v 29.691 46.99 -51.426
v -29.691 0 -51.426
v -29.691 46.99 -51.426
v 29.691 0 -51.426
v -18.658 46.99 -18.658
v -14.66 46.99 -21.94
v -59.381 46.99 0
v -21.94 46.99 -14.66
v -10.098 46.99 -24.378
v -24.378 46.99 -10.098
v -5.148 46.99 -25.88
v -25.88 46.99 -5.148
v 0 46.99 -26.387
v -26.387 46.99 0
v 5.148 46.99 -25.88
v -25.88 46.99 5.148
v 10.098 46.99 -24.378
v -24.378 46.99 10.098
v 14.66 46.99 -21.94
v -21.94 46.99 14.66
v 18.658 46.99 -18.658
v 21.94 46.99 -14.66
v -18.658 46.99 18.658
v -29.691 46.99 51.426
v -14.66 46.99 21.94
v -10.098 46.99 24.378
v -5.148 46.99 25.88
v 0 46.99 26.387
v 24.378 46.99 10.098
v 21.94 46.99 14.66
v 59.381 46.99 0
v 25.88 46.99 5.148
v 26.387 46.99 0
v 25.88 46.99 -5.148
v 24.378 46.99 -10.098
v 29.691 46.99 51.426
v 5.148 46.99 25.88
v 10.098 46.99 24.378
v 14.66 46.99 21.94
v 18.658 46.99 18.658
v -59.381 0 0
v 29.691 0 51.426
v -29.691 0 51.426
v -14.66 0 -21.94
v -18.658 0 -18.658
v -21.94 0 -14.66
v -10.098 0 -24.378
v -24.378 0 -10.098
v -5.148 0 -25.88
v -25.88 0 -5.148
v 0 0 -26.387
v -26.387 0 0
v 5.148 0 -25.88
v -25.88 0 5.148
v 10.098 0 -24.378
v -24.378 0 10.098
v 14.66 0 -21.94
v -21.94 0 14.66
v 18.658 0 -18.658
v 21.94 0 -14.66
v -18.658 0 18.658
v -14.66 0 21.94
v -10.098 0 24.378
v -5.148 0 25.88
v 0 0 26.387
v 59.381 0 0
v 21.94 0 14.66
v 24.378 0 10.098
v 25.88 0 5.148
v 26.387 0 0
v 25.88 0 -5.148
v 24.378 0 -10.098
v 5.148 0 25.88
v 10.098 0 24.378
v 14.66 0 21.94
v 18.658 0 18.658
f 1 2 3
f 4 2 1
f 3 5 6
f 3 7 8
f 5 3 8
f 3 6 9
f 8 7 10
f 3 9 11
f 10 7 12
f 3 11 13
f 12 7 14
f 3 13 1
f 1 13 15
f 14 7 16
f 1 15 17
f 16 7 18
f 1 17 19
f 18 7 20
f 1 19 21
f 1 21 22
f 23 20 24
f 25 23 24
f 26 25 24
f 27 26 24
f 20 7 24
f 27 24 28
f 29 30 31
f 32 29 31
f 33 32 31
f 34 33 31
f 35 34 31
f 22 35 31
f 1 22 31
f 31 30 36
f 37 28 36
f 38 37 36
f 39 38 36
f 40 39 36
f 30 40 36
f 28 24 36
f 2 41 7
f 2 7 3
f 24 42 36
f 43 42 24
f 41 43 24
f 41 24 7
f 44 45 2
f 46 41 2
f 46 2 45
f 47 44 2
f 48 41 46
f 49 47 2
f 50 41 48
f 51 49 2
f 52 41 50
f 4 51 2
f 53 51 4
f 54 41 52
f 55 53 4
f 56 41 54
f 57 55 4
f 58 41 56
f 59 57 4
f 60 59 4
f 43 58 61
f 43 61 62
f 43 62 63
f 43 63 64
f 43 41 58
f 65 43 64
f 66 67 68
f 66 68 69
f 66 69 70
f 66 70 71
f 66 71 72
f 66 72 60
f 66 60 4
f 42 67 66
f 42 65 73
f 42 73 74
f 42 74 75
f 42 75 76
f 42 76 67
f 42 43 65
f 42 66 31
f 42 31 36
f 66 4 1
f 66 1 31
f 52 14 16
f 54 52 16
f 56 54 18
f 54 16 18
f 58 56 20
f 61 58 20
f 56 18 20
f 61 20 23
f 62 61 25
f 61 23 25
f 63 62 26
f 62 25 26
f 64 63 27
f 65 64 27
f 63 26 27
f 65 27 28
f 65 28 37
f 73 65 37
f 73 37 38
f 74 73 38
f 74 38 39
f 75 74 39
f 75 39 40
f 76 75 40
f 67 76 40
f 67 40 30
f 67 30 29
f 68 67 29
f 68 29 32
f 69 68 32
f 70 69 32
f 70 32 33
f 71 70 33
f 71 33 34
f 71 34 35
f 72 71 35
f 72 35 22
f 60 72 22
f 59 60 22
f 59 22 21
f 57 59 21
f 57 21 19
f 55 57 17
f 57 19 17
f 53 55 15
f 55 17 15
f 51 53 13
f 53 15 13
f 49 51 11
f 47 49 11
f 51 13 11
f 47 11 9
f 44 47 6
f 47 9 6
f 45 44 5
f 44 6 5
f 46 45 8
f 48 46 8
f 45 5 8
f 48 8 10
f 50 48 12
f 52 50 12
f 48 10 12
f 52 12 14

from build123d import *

# Parameters (mm, degrees)
F1_DEPTH = 46.99
F2_R     = 26.387041
F3_DEPTH = 46.991


with BuildPart() as f1:
    # F0 (on Front) → F1 (new body)
    with BuildSketch(Plane.XZ):
        Polygon((-29.690725, -51.425844), (29.690725, -51.425844), (59.38145, 0), (29.690725, 51.425844), (-29.690725, 51.425844), (-59.38145, 0), align=None)
    extrude(amount=-F1_DEPTH)

    # F2 (on face) → F3 (cut, through all)
    with BuildSketch(Plane(origin=(0, 46.99, 0), x_dir=(-1, 0, 0), z_dir=(0, 1, 0))):
        Circle(F2_R)
    extrude(amount=-F3_DEPTH, mode=Mode.SUBTRACT)


solid = f1.part
